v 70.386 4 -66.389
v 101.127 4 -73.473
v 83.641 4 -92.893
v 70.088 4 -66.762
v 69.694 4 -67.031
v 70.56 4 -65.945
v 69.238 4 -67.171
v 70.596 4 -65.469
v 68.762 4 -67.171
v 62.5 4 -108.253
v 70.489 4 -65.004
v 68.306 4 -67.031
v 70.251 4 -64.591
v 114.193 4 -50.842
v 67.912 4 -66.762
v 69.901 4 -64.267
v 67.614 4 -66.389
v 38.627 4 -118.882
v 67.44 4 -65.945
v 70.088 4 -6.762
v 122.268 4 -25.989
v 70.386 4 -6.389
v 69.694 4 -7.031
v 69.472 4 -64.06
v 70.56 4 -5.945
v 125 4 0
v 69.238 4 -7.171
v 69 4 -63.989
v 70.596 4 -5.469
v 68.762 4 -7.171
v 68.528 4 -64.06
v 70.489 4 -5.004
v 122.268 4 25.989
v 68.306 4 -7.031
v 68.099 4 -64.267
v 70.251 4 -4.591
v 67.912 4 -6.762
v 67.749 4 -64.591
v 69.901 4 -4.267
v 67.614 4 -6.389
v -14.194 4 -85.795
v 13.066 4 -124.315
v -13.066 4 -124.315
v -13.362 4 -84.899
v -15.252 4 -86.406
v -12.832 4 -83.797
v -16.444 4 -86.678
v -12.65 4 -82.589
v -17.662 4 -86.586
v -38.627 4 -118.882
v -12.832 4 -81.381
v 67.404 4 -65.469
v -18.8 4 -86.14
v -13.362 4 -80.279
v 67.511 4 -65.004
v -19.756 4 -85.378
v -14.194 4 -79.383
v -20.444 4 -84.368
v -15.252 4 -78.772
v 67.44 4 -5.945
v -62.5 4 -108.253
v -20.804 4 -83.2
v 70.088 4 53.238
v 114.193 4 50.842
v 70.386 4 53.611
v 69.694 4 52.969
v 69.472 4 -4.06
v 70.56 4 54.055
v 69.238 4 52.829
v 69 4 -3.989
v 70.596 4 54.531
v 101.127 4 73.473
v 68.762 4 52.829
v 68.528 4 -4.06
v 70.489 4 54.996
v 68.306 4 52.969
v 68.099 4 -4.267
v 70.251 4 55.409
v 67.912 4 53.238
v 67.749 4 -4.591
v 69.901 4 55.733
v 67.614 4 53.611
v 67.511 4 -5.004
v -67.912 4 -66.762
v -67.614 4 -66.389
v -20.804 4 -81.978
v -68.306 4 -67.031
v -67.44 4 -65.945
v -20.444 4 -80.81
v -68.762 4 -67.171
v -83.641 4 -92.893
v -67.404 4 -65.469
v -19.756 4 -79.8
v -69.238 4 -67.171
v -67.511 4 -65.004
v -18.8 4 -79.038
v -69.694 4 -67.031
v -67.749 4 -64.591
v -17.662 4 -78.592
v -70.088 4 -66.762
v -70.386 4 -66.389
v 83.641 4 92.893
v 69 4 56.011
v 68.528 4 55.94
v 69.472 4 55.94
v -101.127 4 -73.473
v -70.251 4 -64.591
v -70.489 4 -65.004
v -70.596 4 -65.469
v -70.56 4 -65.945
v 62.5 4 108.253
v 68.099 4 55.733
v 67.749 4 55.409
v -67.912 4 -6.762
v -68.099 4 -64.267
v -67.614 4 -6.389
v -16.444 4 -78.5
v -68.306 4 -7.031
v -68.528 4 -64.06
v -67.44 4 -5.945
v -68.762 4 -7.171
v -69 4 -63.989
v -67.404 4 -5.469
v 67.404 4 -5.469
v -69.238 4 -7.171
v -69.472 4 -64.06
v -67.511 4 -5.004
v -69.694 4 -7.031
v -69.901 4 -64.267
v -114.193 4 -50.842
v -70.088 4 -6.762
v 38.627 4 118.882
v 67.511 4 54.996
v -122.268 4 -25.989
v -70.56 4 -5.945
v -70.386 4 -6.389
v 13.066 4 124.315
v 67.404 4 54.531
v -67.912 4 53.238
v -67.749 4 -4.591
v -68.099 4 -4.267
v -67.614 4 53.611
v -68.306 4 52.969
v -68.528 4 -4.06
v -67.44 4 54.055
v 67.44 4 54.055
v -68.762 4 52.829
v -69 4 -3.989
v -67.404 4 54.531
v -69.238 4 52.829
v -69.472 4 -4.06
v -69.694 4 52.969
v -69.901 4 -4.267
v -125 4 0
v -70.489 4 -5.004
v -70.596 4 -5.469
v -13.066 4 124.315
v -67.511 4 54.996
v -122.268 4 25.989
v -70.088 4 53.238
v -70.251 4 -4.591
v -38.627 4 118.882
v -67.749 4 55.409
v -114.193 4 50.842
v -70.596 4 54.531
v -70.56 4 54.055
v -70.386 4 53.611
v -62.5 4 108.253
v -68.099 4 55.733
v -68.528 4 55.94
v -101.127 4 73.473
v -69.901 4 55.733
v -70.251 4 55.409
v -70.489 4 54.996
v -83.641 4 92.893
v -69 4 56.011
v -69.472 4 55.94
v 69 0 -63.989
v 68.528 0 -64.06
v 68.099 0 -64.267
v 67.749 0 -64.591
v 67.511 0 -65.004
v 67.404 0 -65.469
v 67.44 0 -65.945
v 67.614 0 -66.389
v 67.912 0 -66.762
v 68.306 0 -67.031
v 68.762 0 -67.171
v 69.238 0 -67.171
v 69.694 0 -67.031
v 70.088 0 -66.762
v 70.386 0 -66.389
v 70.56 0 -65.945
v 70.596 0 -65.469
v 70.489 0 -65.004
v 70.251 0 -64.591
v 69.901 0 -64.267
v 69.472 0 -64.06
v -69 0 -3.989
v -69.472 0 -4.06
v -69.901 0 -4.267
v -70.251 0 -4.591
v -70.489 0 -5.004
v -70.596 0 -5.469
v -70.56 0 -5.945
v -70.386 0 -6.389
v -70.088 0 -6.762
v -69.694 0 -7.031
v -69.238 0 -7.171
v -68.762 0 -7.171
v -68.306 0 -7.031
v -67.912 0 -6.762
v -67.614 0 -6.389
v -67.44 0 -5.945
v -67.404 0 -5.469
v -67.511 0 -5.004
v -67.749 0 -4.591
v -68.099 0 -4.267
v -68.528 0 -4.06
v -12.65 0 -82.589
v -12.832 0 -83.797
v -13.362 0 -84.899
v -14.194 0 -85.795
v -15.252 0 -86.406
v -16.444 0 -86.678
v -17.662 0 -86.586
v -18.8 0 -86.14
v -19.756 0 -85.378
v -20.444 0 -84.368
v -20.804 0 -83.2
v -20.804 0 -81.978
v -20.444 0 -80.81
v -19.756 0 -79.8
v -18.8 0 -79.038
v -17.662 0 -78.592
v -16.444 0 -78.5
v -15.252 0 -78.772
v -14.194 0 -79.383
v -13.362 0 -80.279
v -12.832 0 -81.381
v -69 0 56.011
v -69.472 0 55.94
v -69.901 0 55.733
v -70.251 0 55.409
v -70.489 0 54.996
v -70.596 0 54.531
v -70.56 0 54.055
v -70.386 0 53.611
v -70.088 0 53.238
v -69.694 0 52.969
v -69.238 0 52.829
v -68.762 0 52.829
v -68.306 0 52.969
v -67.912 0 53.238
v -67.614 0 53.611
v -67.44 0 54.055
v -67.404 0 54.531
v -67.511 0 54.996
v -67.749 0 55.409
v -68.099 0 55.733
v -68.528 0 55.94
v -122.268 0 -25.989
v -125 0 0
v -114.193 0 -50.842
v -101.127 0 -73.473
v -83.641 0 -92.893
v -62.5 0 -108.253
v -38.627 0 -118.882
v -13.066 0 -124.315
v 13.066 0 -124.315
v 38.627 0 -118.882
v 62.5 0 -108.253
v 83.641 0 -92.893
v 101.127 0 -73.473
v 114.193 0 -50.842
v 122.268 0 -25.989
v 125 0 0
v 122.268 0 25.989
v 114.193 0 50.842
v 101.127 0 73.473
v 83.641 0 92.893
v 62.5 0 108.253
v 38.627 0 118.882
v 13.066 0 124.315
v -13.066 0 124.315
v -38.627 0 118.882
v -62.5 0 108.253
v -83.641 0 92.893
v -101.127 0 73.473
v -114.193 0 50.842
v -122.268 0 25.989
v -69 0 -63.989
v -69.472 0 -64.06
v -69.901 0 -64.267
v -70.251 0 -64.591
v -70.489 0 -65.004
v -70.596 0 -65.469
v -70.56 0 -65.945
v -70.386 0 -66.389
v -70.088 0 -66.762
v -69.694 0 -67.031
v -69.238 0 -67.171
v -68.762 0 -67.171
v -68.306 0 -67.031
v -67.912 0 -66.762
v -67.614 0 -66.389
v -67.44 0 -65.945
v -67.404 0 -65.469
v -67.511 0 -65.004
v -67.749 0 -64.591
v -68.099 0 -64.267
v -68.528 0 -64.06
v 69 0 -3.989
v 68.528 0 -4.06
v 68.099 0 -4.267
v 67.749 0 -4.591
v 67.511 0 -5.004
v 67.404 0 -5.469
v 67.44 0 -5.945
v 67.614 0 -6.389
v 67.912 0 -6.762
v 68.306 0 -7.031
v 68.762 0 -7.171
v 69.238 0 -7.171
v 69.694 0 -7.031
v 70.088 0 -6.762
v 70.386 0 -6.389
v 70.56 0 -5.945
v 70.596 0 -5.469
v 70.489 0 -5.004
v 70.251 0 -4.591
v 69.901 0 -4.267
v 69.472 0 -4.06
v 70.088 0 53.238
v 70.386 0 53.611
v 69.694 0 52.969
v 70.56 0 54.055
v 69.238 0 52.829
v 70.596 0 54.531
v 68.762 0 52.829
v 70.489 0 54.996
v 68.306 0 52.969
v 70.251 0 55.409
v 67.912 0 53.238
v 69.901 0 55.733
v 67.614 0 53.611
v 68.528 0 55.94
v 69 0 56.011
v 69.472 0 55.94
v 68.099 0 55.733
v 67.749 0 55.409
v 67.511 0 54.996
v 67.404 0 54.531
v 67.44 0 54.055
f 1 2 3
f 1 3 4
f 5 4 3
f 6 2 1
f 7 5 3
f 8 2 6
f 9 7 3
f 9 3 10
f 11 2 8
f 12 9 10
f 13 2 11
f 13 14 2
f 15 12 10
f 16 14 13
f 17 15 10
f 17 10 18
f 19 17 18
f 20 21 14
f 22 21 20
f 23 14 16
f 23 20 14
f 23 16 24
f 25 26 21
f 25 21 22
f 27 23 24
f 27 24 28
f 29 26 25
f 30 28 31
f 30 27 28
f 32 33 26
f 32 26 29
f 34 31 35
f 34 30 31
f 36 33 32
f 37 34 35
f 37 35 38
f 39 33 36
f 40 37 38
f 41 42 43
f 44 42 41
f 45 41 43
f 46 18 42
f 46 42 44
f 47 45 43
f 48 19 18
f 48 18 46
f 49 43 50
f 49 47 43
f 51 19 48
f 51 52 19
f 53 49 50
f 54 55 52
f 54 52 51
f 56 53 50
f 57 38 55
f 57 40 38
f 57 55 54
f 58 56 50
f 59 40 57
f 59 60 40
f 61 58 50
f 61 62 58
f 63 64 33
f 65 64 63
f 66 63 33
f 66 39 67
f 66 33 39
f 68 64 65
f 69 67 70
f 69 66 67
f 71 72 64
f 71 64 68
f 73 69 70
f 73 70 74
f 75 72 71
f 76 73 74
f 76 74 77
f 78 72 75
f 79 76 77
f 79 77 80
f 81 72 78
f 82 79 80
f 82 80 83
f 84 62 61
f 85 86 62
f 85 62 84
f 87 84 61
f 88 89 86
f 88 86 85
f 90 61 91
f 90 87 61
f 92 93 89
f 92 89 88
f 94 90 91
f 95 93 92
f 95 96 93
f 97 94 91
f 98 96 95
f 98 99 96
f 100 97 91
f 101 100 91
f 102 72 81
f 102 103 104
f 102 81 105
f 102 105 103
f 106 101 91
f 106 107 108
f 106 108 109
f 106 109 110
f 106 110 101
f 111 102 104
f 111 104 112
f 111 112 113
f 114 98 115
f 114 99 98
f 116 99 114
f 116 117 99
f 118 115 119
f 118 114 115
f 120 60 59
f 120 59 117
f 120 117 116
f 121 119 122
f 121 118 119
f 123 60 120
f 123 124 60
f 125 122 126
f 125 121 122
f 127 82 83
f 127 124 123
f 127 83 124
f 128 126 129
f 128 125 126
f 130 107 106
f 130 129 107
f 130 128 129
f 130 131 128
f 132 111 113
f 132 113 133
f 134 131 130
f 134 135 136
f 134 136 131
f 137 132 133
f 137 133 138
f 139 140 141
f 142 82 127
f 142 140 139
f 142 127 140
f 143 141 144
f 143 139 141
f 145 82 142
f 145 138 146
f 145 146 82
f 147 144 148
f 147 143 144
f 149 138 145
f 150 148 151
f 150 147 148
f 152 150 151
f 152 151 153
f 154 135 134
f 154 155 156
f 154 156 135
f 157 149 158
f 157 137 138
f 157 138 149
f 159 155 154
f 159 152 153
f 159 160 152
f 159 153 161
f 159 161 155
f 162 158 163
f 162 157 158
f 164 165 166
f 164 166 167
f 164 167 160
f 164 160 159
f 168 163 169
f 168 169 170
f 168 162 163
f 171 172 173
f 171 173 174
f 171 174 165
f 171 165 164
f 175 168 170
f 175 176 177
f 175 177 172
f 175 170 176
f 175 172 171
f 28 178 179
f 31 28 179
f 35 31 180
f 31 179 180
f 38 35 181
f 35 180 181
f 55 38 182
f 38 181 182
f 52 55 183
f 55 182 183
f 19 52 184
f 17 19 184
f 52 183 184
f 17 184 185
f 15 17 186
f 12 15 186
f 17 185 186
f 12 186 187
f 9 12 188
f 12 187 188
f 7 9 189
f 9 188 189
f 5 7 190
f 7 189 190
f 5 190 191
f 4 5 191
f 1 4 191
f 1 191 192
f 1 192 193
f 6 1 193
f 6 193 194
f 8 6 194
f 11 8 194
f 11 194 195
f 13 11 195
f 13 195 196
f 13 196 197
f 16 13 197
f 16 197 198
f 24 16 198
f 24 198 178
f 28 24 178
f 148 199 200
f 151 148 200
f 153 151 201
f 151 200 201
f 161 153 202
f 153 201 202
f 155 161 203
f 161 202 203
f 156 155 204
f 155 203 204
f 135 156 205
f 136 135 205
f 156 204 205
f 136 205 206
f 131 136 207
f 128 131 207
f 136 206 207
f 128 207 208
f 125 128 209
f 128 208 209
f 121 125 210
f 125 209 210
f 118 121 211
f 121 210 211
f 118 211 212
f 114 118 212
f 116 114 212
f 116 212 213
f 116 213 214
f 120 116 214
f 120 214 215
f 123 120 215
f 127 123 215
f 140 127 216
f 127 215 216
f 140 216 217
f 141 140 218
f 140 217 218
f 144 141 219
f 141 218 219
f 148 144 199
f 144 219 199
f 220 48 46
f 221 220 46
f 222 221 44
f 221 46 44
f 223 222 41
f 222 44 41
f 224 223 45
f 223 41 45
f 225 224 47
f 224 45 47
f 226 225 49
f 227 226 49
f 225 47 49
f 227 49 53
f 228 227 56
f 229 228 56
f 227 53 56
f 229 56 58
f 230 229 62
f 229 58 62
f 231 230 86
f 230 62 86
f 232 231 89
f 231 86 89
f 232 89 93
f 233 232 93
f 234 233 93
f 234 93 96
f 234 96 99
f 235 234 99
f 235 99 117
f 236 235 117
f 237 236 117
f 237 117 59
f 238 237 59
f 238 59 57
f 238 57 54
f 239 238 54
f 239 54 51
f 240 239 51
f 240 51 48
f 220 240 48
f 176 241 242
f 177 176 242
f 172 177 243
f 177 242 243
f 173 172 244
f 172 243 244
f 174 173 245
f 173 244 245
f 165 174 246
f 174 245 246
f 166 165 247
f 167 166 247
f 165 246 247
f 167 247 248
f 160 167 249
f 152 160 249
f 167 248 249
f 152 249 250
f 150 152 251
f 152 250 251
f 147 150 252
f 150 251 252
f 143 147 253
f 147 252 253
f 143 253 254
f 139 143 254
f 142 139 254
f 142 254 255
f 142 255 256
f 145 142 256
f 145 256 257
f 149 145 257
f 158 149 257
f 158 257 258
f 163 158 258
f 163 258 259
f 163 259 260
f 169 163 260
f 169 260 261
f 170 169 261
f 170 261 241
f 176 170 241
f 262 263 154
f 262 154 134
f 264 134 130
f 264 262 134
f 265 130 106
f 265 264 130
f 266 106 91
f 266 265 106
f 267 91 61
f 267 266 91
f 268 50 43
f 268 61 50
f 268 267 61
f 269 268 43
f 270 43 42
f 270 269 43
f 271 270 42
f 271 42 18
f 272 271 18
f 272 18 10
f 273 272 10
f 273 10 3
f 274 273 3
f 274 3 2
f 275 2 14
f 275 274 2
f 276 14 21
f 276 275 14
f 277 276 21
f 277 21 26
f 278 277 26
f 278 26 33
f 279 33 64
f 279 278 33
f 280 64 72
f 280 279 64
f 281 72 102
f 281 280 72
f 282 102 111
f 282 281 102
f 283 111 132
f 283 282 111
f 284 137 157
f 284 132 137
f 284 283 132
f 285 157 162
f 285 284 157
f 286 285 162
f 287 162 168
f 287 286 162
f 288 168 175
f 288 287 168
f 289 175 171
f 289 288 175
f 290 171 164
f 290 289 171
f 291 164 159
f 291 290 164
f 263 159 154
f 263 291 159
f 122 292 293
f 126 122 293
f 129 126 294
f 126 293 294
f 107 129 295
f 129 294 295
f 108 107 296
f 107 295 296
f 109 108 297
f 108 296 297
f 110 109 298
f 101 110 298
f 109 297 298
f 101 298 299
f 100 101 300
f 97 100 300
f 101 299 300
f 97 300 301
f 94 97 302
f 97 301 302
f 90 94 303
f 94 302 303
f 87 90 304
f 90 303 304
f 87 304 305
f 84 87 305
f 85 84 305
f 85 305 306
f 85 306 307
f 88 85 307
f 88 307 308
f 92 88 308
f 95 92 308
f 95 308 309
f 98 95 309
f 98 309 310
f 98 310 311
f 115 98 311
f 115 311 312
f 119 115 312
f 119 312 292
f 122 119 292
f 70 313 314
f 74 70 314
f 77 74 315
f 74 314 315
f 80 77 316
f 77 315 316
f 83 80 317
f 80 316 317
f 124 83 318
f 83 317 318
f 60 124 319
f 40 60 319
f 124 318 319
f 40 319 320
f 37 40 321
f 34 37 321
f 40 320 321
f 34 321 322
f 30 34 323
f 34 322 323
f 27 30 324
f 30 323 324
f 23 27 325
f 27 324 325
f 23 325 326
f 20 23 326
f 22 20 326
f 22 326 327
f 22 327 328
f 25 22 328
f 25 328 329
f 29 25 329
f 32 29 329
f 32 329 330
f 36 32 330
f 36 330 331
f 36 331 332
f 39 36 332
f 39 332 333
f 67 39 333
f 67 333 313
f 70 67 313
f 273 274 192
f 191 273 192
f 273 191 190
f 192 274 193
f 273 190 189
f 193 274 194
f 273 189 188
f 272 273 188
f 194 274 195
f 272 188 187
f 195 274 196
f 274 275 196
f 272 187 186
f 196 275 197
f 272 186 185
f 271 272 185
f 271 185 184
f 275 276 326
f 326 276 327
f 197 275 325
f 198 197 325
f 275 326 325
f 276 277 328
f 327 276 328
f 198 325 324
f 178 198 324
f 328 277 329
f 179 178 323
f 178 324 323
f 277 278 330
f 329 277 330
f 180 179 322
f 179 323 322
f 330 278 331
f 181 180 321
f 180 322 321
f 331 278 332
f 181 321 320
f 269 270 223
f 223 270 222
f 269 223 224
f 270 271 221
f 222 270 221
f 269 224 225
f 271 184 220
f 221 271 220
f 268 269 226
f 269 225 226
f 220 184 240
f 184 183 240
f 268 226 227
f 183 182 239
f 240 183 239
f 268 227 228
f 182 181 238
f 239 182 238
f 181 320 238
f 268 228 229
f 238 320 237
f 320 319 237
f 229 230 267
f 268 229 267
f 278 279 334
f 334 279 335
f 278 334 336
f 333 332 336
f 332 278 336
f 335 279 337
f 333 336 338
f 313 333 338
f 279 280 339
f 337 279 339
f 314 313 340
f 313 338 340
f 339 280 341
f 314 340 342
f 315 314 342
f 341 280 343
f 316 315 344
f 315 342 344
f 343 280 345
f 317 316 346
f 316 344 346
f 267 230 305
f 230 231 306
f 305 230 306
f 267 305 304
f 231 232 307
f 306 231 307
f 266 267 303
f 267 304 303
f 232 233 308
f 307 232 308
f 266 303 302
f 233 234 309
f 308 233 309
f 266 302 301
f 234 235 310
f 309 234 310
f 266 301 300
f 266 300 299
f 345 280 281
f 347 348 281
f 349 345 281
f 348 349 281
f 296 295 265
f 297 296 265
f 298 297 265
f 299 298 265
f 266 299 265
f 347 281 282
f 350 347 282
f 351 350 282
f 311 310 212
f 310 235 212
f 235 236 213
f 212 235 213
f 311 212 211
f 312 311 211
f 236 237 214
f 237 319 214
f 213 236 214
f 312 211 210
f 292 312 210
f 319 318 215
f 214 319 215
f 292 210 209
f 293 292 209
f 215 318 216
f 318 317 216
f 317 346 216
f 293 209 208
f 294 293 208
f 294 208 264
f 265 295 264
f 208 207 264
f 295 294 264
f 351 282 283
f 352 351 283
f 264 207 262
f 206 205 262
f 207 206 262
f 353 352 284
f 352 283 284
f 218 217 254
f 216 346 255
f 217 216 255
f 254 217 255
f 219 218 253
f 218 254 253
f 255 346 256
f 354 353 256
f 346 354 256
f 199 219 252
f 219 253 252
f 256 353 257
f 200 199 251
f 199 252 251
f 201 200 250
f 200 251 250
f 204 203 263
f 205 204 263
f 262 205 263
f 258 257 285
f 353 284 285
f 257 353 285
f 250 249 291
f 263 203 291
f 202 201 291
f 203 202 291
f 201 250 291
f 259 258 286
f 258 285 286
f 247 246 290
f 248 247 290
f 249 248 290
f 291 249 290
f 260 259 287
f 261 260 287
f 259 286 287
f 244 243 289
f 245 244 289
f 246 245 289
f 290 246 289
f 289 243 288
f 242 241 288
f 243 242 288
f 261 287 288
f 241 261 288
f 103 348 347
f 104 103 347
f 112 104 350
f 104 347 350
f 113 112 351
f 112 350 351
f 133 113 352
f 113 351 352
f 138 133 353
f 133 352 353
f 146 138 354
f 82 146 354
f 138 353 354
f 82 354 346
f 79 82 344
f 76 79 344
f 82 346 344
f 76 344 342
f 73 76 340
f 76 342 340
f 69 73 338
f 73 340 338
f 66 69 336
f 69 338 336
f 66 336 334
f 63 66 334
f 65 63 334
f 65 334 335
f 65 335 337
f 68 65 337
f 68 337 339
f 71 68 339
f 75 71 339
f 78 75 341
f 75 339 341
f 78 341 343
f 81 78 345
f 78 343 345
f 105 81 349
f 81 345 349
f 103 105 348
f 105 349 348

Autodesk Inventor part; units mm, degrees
ref_plane "YZ Plane" through (0, 0, 0) normal (1, 0, 0) x (0, 1, 0)
ref_plane "XZ Plane" through (0, 0, 0) normal (0, 1, 0) x (-1, 0, 0)
ref_plane "XY Plane" through (0, 0, 0) normal (0, 0, 1) x (1, 0, 0)
sketch "スケッチ1" plane through (0, 0, 0) normal (0, 1, 0) x (-1, 0, 0)
  circle A0 centre (0, 0) radius 125
  dimension "d0" = 250
extrude "押し出し1" add sketch "スケッチ1" along normal blind 4
sketch "スケッチ2" plane through (0, 4, 0) normal (0, 1, 0) x (1, 0, 0)
  line L0 (75, -84.411) -> (-75, -84.411)
  line L1 (-75, -84.411) -> (-75, 95.589)
  line L2 (-75, 95.589) -> (75, 95.589)
  line L3 (75, 95.589) -> (75, -84.411)
  line L4 (75, -84.411) -> (-75, 95.589) construction
  line L5 (-75, -84.411) -> (75, 95.589) construction
  circle A0 centre (0, 0) radius 121.5
  line L6 (0, 0) -> (0, -125) construction
  circle A1 centre (0, 0) radius 125 projected
  line L7 (0, 0) -> (108.2532, 62.5) construction
  line L8 (0, 0) -> (-108.2532, 62.5) construction
  circle A2 centre (-16.75, 82.589) radius 4.1
  point P0 (0, 5.589)
  dimension "d3" = 150
  dimension "d4" = 180
  dimension "d5" = 243
  dimension "d8" = 360
  dimension "d12" = 16.75
  dimension "d13" = 13
  dimension "d14" = 8.2
extrude "押し出し2" cut sketch "スケッチ2" against normal blind 4 contours A2
sketch "スケッチ4" plane through (0, 4, 0) normal (0, 1, 0) x (1, 0, 0)
  circle A0 centre (0, 0) radius 121.5
  line L0 (75, -84.411) -> (-75, -84.411)
  line L1 (-75, -84.411) -> (-75, 95.589)
  line L2 (-75, 95.589) -> (75, 95.589)
  line L3 (75, 95.589) -> (75, -84.411)
  line L4 (75, -84.411) -> (-75, 95.589) construction
  line L5 (-75, -84.411) -> (75, 95.589) construction
  line L6 (0, 0) -> (0, -29.9183)
  point P0 (0, 5.589)
  point P1 (69, -54.411)
  point P2 (69, 5.589)
  point P3 (69, 65.589)
  point P4 (-69, -54.411)
  point P5 (-69, 5.589)
  point P6 (-69, 65.589)
  dimension "d17" = 243
  dimension "d18" = 150
  dimension "d19" = 180
  dimension "d20" = 30
  dimension "d21" = 6
  dimension "d22" = 60
  dimension "d23" = 60
hole "穴1" at (69, 4, 54.411) at (69, 4, -5.589) at (69, 4, -65.589) at (-69, 4, -65.589) at (-69, 4, -5.589) at (-69, 4, 54.411) direction (0, -1, 0) diameter 3.2 end through all
properties part number "中間台1" material "MDF 中密度繊維ボード"
